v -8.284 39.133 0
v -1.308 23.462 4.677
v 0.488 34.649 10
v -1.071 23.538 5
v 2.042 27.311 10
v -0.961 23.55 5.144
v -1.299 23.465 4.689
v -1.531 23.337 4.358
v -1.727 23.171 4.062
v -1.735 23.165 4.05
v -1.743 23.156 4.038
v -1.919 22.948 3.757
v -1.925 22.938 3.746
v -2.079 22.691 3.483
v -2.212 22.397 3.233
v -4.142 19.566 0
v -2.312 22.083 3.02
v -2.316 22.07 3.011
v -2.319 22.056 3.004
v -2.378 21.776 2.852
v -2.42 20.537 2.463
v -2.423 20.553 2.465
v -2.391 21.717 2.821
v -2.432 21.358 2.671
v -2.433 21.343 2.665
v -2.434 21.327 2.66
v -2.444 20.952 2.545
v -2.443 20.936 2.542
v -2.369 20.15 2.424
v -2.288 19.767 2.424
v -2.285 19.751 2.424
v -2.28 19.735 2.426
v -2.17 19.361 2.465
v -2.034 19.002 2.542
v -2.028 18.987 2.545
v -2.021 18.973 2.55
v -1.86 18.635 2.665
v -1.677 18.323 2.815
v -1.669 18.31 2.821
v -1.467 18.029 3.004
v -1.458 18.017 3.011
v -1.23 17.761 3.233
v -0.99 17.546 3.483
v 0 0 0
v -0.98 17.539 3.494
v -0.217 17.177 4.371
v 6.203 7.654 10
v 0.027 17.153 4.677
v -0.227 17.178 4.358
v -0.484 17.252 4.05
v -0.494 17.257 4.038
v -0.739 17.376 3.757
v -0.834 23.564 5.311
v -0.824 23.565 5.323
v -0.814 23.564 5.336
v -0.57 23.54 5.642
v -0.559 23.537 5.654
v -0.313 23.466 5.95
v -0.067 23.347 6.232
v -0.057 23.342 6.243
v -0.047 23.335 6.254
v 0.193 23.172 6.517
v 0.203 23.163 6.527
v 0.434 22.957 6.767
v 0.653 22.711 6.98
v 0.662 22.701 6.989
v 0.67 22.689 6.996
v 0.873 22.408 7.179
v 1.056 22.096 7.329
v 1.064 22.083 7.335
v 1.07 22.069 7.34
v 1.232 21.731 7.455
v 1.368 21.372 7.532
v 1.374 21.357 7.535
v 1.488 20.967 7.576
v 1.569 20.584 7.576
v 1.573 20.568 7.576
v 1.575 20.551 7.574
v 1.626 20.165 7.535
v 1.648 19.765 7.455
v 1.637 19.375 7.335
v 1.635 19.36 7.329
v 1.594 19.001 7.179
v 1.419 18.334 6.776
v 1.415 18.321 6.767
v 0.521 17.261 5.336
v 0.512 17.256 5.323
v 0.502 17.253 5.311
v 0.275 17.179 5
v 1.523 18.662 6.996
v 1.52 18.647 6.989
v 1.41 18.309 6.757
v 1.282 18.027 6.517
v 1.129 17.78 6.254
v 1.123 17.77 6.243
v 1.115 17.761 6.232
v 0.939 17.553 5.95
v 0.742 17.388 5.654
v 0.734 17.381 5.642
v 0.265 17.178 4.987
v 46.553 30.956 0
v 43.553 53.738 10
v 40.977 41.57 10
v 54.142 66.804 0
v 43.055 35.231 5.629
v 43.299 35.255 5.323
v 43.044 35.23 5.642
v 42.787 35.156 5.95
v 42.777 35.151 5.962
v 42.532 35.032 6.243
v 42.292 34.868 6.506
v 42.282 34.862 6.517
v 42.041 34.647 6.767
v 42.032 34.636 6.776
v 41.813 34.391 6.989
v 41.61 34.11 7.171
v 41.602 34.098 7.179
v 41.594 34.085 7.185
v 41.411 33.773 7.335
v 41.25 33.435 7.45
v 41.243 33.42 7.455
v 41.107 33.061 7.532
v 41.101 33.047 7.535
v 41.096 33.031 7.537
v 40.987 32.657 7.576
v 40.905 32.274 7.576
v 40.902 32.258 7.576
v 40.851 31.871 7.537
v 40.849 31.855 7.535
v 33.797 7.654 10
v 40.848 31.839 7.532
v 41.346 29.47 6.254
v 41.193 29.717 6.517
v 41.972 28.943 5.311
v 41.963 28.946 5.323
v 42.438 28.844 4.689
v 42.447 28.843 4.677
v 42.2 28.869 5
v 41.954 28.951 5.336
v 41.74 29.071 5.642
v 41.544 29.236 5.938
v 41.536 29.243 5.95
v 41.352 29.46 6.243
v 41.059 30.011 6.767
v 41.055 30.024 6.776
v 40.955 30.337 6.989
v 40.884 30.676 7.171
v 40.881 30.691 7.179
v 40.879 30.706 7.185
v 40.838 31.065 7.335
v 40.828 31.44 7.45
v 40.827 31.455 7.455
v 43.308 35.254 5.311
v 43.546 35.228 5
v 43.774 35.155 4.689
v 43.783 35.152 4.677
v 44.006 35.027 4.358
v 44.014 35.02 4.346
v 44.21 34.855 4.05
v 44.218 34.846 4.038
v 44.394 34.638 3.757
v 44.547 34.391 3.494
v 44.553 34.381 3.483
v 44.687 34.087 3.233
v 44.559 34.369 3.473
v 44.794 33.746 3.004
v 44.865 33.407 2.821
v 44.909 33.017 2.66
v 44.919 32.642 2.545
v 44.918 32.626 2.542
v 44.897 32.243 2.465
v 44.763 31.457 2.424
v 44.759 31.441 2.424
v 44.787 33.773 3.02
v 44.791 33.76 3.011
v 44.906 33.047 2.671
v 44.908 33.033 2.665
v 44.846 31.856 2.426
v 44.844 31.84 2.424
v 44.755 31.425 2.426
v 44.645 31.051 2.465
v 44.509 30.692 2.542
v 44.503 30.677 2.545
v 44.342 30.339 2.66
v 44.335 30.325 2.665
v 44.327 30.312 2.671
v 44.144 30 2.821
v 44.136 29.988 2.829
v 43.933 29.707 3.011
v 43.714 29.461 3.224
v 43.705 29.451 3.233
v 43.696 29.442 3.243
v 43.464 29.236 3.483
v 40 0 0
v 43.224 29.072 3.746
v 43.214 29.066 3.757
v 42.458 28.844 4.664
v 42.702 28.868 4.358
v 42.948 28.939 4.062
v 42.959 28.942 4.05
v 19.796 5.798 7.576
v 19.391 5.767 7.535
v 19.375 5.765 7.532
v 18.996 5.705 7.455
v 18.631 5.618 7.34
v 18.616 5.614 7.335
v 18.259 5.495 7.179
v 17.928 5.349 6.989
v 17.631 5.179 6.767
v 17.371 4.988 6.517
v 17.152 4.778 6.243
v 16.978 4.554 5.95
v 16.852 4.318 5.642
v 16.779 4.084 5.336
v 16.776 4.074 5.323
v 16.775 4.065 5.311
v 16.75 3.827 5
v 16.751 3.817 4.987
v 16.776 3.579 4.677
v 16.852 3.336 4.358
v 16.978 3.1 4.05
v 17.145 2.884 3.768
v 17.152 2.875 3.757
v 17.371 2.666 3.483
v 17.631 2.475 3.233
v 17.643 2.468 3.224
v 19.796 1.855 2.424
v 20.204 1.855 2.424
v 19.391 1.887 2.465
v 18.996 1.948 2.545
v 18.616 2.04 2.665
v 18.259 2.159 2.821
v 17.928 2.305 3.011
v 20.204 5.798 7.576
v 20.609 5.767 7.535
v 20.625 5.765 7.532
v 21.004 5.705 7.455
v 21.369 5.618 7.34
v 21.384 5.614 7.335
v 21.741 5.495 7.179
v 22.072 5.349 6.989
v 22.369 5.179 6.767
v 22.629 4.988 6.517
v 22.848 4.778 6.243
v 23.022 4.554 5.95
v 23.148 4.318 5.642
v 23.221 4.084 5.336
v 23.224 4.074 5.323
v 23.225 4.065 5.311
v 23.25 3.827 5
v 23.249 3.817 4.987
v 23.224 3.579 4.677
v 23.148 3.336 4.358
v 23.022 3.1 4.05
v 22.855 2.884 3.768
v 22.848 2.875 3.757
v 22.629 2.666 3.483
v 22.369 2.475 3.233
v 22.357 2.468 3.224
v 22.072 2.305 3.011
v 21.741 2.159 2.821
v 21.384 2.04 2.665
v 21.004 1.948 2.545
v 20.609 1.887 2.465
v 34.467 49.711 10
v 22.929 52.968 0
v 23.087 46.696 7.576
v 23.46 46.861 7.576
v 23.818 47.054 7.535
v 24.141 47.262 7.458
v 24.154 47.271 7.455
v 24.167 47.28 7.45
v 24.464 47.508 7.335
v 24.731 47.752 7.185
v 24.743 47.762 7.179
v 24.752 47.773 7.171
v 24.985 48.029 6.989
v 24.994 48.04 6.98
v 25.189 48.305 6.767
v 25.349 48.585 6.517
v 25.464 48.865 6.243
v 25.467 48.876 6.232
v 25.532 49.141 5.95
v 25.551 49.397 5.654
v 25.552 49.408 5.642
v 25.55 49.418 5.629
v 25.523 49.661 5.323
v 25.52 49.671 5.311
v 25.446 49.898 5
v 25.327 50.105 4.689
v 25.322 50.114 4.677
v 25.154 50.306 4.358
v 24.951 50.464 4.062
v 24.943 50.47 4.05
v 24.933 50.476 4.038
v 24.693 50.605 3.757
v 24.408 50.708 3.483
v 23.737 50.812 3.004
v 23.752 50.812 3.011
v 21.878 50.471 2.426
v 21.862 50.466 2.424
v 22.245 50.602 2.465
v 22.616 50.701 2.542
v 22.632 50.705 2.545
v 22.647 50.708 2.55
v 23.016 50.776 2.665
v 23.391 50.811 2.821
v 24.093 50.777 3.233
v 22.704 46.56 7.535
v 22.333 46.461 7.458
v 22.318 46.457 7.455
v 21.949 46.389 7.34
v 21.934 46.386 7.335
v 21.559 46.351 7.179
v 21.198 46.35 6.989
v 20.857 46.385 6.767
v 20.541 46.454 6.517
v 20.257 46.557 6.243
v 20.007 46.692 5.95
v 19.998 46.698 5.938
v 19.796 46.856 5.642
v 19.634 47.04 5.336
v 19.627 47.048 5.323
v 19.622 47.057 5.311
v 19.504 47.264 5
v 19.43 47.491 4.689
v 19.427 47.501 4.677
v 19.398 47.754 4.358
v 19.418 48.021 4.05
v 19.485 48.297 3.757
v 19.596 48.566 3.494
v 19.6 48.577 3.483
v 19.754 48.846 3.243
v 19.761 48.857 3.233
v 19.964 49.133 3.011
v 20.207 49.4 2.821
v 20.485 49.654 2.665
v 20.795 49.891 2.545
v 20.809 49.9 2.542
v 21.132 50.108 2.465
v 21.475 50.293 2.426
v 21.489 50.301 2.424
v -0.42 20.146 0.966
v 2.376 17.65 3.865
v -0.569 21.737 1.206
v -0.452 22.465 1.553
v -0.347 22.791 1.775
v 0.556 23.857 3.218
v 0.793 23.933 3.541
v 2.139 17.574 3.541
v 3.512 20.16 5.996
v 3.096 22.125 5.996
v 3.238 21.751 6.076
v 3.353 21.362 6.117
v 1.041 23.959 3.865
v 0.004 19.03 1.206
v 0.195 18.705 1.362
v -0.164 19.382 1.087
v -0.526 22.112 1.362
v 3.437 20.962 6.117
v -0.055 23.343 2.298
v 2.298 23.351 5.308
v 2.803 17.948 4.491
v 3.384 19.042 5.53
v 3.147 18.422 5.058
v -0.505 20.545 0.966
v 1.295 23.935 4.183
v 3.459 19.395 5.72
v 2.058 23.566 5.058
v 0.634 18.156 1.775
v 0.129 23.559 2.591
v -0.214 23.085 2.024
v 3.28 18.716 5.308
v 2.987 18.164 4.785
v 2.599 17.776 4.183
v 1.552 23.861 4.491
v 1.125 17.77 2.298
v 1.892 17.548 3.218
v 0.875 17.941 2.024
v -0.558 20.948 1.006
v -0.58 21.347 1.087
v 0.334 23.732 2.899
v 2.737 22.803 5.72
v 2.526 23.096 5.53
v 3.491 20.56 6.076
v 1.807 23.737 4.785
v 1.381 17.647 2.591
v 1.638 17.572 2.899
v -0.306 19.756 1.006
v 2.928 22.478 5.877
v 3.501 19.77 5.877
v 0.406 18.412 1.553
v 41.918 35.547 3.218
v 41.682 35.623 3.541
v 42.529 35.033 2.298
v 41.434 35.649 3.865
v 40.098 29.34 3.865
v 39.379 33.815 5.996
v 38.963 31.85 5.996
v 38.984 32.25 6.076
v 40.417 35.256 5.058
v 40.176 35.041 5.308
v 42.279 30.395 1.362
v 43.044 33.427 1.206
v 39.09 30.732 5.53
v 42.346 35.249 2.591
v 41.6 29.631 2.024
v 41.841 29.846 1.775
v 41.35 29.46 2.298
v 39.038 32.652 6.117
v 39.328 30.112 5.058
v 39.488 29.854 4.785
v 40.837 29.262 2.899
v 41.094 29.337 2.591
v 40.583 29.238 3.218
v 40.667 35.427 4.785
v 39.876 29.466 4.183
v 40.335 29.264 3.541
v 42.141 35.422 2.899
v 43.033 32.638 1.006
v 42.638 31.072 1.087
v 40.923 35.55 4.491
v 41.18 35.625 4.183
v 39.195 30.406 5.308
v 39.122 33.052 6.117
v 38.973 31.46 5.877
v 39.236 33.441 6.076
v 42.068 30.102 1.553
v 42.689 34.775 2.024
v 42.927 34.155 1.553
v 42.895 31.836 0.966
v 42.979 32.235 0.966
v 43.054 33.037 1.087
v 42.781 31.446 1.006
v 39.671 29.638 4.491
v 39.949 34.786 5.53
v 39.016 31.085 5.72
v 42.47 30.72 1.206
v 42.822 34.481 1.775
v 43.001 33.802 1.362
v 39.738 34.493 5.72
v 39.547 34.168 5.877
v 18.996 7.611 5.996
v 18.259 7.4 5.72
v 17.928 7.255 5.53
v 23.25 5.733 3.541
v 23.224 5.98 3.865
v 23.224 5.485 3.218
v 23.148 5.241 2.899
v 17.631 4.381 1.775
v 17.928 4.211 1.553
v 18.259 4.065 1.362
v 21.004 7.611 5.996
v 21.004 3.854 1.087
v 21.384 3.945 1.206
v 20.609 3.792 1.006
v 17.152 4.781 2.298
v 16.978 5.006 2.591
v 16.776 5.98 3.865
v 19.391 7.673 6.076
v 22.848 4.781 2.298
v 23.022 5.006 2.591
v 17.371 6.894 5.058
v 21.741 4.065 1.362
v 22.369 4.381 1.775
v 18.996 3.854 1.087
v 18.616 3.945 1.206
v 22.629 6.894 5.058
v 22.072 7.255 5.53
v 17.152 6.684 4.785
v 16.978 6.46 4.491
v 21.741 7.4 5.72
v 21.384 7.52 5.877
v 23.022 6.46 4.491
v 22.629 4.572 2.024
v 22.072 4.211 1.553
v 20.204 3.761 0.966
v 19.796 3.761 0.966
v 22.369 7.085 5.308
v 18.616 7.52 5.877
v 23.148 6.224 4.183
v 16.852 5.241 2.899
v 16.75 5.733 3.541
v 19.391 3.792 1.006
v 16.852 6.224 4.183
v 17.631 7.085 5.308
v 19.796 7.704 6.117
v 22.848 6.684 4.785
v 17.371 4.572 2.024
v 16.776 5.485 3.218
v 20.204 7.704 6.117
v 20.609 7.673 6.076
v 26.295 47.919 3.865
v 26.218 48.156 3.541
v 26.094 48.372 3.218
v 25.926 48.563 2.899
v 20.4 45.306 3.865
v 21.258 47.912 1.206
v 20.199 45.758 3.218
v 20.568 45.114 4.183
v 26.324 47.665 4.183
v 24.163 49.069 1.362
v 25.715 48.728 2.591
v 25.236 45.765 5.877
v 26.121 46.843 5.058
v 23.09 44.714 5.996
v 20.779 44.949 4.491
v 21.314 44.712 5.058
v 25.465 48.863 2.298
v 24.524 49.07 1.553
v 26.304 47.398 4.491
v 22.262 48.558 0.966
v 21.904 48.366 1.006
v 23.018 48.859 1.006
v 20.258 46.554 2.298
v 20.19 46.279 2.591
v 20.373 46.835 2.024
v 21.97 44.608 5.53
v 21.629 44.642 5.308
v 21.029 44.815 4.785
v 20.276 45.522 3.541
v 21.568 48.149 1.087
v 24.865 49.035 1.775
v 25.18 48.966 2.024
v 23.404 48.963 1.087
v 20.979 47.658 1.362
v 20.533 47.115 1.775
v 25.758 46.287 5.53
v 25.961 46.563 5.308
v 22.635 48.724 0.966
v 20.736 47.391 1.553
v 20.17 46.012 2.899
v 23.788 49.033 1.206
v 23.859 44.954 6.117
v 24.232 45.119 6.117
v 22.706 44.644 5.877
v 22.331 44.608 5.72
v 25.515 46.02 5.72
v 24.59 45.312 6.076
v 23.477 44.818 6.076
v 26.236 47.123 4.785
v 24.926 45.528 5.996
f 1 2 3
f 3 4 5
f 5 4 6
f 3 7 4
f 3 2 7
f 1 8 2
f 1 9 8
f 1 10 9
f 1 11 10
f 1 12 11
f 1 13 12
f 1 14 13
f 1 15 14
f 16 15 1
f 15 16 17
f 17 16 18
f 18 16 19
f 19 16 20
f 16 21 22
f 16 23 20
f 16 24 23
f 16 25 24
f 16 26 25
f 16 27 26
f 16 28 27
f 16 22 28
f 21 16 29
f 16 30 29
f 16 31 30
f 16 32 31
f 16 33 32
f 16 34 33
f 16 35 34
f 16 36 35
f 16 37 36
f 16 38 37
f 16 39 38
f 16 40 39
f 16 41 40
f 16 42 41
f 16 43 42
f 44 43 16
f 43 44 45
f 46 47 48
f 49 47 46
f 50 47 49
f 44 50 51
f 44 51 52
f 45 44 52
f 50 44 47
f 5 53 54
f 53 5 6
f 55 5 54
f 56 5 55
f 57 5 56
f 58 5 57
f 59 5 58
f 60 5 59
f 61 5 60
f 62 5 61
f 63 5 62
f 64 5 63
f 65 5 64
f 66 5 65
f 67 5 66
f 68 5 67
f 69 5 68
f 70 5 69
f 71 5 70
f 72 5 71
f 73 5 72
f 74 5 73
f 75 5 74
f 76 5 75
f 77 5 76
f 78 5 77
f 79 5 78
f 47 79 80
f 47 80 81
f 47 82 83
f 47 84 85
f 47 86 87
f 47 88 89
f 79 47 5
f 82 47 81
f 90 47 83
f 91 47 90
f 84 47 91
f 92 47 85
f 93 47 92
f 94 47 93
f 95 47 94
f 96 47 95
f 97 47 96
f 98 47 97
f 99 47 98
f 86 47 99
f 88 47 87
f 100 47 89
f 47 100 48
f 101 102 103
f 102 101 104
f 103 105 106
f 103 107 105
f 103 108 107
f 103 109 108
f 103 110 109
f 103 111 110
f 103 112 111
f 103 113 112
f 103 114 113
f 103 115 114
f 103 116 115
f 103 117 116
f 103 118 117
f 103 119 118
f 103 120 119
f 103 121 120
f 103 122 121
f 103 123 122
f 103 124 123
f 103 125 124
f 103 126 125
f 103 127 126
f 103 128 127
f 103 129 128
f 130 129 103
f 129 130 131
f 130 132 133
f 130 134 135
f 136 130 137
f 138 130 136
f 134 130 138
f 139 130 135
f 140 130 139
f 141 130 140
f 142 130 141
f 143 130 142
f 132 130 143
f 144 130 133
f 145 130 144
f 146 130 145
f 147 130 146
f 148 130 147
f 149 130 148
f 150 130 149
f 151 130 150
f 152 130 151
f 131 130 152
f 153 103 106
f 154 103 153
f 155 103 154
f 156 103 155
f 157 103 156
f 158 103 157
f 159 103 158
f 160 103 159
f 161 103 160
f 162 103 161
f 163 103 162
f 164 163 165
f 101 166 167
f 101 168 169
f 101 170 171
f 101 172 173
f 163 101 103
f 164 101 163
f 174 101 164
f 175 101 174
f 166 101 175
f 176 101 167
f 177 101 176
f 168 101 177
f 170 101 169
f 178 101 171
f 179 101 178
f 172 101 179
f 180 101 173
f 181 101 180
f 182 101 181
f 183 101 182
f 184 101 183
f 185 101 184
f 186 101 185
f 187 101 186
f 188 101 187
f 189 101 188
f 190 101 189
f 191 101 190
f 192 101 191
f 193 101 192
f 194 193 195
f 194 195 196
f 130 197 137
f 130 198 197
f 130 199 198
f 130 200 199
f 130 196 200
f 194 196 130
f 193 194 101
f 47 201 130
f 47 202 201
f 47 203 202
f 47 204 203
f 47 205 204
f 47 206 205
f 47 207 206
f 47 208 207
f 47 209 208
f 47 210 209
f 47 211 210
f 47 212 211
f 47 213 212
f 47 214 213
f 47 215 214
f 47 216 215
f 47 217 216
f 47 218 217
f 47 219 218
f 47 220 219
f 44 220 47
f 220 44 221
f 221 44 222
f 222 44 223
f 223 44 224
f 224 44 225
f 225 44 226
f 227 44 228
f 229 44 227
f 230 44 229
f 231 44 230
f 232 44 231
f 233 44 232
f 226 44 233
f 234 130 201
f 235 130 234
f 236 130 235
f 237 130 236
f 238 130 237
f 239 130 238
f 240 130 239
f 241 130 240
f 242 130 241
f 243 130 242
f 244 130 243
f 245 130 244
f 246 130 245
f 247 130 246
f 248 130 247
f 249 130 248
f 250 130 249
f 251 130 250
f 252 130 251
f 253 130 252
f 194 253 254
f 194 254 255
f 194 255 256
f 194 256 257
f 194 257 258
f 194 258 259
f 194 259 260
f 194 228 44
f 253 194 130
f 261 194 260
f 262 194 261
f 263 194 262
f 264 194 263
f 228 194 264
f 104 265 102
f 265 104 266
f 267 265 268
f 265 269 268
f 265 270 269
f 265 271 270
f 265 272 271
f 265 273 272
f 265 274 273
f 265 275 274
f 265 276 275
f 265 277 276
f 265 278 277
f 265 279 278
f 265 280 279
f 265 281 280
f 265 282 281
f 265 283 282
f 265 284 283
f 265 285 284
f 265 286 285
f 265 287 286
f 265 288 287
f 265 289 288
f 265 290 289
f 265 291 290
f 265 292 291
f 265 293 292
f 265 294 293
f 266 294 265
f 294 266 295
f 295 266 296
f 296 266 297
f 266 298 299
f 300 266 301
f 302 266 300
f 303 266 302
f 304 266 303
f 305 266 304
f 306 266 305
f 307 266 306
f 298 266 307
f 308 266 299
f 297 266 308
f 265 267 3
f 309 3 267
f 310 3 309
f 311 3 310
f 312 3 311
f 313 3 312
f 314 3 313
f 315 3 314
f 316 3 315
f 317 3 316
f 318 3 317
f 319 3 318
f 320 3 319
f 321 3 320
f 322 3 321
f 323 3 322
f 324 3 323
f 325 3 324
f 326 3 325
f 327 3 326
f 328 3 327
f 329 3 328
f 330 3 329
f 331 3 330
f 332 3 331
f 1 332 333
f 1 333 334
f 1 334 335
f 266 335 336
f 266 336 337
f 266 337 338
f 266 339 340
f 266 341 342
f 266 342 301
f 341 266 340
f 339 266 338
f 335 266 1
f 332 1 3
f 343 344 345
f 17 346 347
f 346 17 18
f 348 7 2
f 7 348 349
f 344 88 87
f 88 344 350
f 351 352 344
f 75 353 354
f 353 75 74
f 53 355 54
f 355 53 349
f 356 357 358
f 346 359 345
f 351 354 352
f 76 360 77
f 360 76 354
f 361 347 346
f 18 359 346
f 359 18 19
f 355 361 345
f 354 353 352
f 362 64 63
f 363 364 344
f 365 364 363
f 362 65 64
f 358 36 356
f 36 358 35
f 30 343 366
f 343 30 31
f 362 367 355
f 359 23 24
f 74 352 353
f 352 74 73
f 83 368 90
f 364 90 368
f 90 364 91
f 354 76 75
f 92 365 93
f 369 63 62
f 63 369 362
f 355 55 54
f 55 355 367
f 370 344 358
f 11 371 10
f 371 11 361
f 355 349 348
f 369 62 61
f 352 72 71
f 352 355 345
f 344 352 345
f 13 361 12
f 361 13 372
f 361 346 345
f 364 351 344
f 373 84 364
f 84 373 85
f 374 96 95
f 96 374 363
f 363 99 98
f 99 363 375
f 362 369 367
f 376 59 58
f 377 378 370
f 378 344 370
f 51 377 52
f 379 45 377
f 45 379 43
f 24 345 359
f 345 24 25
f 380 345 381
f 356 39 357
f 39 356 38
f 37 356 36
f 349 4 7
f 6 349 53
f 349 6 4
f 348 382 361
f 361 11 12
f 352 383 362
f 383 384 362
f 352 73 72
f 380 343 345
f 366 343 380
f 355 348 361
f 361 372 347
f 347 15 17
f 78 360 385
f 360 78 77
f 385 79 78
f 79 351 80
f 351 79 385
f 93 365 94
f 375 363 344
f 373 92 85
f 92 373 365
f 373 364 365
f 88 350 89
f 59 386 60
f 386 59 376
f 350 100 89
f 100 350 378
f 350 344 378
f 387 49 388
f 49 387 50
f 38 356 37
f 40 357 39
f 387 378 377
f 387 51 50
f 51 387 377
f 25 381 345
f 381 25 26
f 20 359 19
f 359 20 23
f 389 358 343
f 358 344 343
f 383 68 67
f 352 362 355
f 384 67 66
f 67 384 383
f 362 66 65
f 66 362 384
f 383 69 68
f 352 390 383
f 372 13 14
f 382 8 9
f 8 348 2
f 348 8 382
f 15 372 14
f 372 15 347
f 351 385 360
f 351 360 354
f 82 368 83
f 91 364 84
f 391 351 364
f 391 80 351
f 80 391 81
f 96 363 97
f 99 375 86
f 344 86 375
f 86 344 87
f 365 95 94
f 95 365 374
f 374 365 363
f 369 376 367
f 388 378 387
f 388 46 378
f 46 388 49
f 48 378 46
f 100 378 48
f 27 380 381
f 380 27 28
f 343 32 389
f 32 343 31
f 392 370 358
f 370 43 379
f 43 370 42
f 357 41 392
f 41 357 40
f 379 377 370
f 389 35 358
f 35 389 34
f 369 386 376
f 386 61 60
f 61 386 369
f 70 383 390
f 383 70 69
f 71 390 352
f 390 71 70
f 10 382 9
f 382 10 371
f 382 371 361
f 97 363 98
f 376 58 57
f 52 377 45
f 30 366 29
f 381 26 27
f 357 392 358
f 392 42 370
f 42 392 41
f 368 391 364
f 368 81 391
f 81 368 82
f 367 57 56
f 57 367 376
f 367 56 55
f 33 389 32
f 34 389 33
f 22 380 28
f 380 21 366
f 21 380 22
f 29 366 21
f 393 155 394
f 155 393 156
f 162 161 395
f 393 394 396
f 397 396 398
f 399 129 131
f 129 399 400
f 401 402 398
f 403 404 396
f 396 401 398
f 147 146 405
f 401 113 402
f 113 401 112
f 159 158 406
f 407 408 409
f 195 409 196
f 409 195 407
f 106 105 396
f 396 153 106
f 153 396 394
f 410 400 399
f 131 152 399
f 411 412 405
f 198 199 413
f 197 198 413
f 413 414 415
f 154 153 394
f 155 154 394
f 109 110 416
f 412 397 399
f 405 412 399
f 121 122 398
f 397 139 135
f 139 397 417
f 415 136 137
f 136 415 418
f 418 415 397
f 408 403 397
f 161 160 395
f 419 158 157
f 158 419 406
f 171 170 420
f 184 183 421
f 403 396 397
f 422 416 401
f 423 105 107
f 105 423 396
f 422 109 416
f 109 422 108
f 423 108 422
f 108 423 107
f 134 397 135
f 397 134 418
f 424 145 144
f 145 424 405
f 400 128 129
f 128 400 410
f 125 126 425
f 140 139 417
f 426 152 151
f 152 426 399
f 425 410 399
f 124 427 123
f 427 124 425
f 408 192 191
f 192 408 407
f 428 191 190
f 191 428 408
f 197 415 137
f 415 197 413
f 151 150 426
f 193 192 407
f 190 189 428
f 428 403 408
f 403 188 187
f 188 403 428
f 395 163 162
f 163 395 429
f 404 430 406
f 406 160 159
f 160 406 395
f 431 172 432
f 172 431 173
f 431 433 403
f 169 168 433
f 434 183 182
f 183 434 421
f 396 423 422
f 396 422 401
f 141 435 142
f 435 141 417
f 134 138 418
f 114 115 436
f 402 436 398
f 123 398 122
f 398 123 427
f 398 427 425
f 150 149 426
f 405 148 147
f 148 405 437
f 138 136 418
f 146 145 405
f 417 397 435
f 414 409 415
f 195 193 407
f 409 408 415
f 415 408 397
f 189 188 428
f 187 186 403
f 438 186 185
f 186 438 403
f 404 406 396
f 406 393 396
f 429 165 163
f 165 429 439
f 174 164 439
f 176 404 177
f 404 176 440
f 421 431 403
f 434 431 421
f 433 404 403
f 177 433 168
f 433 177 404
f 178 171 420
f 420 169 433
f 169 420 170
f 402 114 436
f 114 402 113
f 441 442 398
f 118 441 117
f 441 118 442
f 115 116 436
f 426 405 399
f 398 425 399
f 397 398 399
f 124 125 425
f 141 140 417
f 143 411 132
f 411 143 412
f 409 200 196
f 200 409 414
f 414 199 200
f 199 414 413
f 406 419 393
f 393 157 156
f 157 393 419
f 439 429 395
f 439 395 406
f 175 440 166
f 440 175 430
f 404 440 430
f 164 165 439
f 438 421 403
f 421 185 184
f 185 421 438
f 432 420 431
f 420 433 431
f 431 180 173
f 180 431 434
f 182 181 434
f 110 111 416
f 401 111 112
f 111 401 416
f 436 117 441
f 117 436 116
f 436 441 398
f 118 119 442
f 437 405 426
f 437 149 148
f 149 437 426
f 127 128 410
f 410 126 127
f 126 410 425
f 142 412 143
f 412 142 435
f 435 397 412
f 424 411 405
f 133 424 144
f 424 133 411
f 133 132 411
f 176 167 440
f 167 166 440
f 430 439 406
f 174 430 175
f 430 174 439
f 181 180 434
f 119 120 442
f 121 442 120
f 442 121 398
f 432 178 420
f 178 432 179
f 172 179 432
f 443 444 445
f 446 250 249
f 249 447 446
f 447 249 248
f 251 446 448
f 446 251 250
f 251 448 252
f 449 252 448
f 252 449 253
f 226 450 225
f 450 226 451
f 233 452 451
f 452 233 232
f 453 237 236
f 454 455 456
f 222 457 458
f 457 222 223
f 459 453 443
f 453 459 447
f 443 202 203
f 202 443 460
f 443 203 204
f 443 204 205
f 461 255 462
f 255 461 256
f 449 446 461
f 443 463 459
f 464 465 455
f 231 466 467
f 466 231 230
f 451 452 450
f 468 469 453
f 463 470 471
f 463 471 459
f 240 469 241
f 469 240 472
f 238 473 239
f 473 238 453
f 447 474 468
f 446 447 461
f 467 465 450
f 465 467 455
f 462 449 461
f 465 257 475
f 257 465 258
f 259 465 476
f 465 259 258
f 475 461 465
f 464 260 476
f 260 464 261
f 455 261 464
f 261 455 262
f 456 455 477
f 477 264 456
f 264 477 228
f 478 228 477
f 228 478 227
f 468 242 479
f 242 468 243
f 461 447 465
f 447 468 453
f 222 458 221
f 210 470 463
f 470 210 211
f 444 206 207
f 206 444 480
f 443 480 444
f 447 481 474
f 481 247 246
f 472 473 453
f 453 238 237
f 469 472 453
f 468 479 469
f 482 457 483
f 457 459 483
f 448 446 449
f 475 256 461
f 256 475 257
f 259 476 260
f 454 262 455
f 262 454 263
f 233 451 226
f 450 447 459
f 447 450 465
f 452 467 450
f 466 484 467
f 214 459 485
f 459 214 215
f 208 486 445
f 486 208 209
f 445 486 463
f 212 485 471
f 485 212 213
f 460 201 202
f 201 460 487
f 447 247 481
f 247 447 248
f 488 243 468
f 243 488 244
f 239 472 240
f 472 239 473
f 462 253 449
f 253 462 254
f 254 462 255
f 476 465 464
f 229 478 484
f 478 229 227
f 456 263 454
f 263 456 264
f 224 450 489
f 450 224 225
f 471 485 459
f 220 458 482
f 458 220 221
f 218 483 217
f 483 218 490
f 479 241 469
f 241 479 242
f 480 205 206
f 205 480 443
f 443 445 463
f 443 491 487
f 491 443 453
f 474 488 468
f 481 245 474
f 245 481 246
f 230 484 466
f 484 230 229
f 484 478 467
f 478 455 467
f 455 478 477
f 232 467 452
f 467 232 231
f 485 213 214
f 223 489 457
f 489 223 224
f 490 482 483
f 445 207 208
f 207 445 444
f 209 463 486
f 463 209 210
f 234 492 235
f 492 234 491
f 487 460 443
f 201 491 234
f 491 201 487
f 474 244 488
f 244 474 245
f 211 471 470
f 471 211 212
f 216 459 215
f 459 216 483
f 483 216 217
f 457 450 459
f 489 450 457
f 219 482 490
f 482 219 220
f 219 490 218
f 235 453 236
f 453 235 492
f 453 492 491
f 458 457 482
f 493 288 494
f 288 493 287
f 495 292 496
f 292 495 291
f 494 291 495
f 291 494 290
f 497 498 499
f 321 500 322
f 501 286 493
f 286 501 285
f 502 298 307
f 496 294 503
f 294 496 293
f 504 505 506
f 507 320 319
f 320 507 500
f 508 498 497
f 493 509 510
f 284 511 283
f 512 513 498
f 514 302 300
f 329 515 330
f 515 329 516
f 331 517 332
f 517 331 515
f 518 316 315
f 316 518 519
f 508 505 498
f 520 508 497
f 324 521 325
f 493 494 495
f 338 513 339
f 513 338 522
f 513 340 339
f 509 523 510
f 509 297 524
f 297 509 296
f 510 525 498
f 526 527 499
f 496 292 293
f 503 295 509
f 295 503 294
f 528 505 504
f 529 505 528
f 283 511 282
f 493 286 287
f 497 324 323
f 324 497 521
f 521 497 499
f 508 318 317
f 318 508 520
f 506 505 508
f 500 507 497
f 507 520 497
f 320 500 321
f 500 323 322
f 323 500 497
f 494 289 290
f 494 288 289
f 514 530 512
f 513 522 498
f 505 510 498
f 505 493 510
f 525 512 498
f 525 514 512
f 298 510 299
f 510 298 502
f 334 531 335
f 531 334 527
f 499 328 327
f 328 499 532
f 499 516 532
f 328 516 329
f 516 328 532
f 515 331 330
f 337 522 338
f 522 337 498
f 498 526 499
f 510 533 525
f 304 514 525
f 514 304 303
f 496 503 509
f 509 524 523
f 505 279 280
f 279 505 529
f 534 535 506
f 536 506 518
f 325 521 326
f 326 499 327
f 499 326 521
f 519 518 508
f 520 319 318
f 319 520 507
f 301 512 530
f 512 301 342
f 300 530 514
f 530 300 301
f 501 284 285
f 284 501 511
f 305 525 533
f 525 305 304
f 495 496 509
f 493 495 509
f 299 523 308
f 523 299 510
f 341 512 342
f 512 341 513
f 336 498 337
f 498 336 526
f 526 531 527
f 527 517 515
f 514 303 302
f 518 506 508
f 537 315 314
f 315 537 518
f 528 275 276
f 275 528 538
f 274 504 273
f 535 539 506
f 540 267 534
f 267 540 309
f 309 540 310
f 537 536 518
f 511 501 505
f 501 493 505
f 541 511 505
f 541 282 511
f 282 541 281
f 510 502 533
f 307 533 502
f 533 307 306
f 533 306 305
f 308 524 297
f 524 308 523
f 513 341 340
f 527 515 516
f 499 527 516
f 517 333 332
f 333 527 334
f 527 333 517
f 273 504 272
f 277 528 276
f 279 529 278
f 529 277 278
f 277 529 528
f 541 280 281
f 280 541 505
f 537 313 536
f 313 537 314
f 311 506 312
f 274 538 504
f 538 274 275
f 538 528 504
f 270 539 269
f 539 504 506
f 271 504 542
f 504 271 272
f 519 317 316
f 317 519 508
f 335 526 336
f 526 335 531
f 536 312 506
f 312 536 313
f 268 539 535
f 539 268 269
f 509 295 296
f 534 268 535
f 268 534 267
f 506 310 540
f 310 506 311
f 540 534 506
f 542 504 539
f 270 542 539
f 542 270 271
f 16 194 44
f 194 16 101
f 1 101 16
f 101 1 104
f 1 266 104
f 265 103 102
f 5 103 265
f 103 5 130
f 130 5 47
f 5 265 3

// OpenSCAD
/*
Trapezohedra with magnets tile, by eshira
Use axially aligned magnets (4 per tile).
The tiles are split into two groups with distinct magnet patterns:
The top half and bottom half of the trapezohedron.
The long sides of a tile must have opposite poles facing out
All tiles from both groups must be identical with respect to the long sides.
The short sides of a tile must have opposite poles facing out
One group must have the opposite polarity of the other group with respect to the short sides.
*/

//User Defined Variables
side = 40; //side length of the short side
thickness = 10; //how thick (z dimension) the tile is
magnetdepth = 2.5; //depth of the magnet holes; tailor this to suit your 3d printer
magnetdiam = 6.5; //diameter of the magnet holes; tailor this to suit your 3d printer

//Other
$fn=50;
M_PI = 3.14159265359;

//Choose one from the following tile types to uncomment:
//trigonal();
tetragonal();
//pentagonal();
//hexagonal();
//heptagonal();
//octagonal();

module magnetA(dihedral,alpha, side2) {
    sdiag = side*sqrt( 2*(1-cos(alpha)) ); //short diagonal of the kite
    ldiag = sin(alpha)*side2/sin(alpha/2); //long diagonal of the kite 
    t_h = 0.5*side*(1/cos(alpha/2))*sin(alpha/2)*sin(dihedral/2)/sin(90-0.5*dihedral);   
    ptr = .5*thickness/t_h;
    extra=.1;
    //Place the magnet in the exact middle of the face; mix movement along long diagonal with movement along side, weighed by ptr
    translate([ptr*0.5*side*(1/cos(alpha/2))*cos(alpha/2)-0.5*(1-ptr)*side*sin(alpha-90),ptr*0.5*side*(1/cos(alpha/2))*sin(alpha/2)+0.5*(1-ptr)*side*sin(alpha),ptr*t_h]){
        rotate([180-dihedral/2,0,alpha]){
            translate([0,0,-extra]){
                linear_extrude(center=false,height=magnetdepth){ circle(magnetdiam/2);}
            }
        }
    }
}

module magnetB(dihedral,alpha,side2){
    sdiag = side*sqrt( 2*(1-cos(alpha)) ); //short diagonal of the kite
    ldiag = sin(alpha)*side2/sin(alpha/2); //long diagonal of the kite 
    t_h = 0.5*side*(1/cos(alpha/2))*sin(alpha/2)*sin(dihedral/2)/sin(90-0.5*dihedral);   
    ptr = .5*thickness/t_h;
    extra=.1;
    //Place the magnet in the exact middle of the face; mix movement along long diagonal with movement along side, weighed by ptr

    translate([side-ptr*0.5*side*(1/cos(alpha/2))*cos(alpha/2)+0.5*(1-ptr)*side2*cos(180-alpha),ptr*0.5*side*(1/cos(alpha/2))*sin(alpha/2)+0.5*(1-ptr)*side2*sin(180-alpha),ptr*t_h]){
        rotate([-180+dihedral/2,0,180-alpha]){
            translate([0,0,-extra]){
                linear_extrude(center=false,height=magnetdepth){ circle(magnetdiam/2);}
            }
        }

    }
}

module magnets(dihedral,alpha,side2){
    magnetA(dihedral,alpha,side2);
    magnetB(dihedral,alpha,side2);
    mirror([0,1,0]){ rotate([0,0,-alpha]){magnetA(dihedral,alpha,side2);}}	
    mirror([0,1,0]){ rotate([0,0,-alpha]){magnetB(dihedral,alpha,side2);}}
}

module chamfers(dihedral,alpha,beta,side2) {
    rotate([(180-dihedral)/2,0,alpha]){
        linear_extrude(center=true, height=thickness*10) {
            polygon([[-5,0],[-5,thickness],[side+5,thickness],[side+5,0]]);
        }
    }
    translate([side,0,0]){
        rotate([(-180+dihedral)/2,0,180-alpha]){
            translate([0,-thickness,0]){
                linear_extrude(center=true, height=thickness*10) { polygon([[-5,0],[-5,thickness],[side2,thickness],[side2,0]]); }
            }
        }
    }

    rotate([(-180+dihedral)/2,0,0]){
        translate([2.5,-thickness,0]){
            linear_extrude(center=true, height=thickness*10) { polygon([[-5,0],[-5,thickness],[side,thickness],[side,0]]); }
        }
    }

    translate([side*cos(alpha),side*sin(alpha),0]){
        mirror([0,1,0]){
            rotate([(-180+dihedral)/2,0,-180+alpha+beta]){
                translate([2.5,-thickness,0]){
                    linear_extrude(center=true, height=thickness*10) { polygon([[-5,0],[-5,thickness],[side2,thickness],[side2,0]]);}
                }
            }
        }
    }
}

module trigonal(){ //really a cube
    dihedral = 90;
    s = side; //a square, all sides are the same, all angles 90 degrees
    difference(){
        linear_extrude(height=thickness){
            polygon([[0,0],[s,0],[s,s],[0,s]]);
        }
        union(){
            chamfers(dihedral,90,90,s);
            magnets(dihedral,90,s);
        }
    }
    echo("Print 6 faces.");
}

module tetragonal(){
    dihedral = acos(-(2*sqrt(2)-1)/7);
    s1 = sqrt(sqrt(2)-1); //sides based on unit edge length square antiprism
    s2 = sqrt(2*(1+sqrt(2)))/2;
    side2 = s2*side/s1; //adjusted side based on user input
    A1 = 54.14143232789412; //acute interior angle of the kite
    A2 = 101.95285589070195; //all three other interior angles of the kite are the same
    difference(){
        linear_extrude(height=thickness){ polygon([[0,0],[side,0],[side+side2*cos(180-A2),side2*sin(180-A2)],[-side*cos(180-A2),side*sin(180-A2)]]); }
        union(){
            chamfers(dihedral,A2,A1,side2);
            magnets(dihedral,A2,side2);
        }
    }
    echo("Print 8 faces.");
}

module pentagonal(){
    dihedral = acos(-sqrt(5)/5);
    s1 = (sqrt(5)-1)/2;
    s2 = (1+sqrt(5))/2;
    side2 = s2*side/s1; //adjusted side based on user input
    A1 = 36; //acute interior angle of the kite
    A2 = 108; //all three other interior angles of the kite are the same
    difference(){
        linear_extrude(height=thickness){polygon([[0,0],[side,0],[side+side2*cos(180-A2),side2*sin(180-A2)],[-side*cos(180-A2),side*sin(180-A2)]]);}
        union() {
            chamfers(dihedral,A2,A1,side2);
            magnets(dihedral,A2,side2);
        }
    }
    echo("Print 10 faces.");
}

module hexagonal(){
    dihedral = acos(-sqrt(3)/3);
    s1 = sqrt(2*(sqrt(3)-1))/2;
    s2 = sqrt(2*(5+3*sqrt(3)))/2 ;
    side2 = s2*side/s1; //adjusted side based on user input
    A1 = 25.587895702680132; //acute interior angle of the kite
    A2 = 111.47070143243995; //all three other interior angles of the kite are the same
    difference(){
        linear_extrude(height=thickness){ polygon([[0,0],[side,0],[side+side2*cos(180-A2),side2*sin(180-A2)],[-side*cos(180-A2),side*sin(180-A2)]]);}
        union(){
            chamfers(dihedral,A2,A1,side2);
            magnets(dihedral,A2,side2);
        }
    }
    echo("Print 12 faces.");
}

module heptagonal(){
    dihedral = 132.017867361;
    s1 = 0.59740762289429270714;
    s2 = 3.0162617059937969890;
    side2 = s2*side/s1; //adjusted side based on user input
    A1 = 19.083716786371607; //acute interior angle of the kite
    A2 = 113.63876107120947; //all three other interior angles of the kite are the same
    difference(){
        linear_extrude(height=thickness){polygon([[0,0],[side,0],[side+side2*cos(180-A2),side2*sin(180-A2)],[-side*cos(180-A2),side*sin(180-A2)]]);}
        union(){
            chamfers(dihedral,A2,A1,side2);
            magnets(dihedral,A2,side2);
        }
    }
    echo("Print 14 faces.");
}

module octagonal(){
    dihedral = 137.370466429;
    s1 = sqrt(1-sqrt(2)+sqrt(2-sqrt(2)));
    s2 = sqrt(2*(8+5*sqrt(2)+sqrt(2*(58+41*sqrt(2)))))/2 ;
    side2 = s2*side/s1; //adjusted side based on user input
    A1 = 14.76071381173551; //acute interior angle of the kite
    A2 = 115.07976206275484; //all three other interior angles of the kite are the same
    difference(){
        linear_extrude(height=thickness){ polygon([[0,0],[side,0],[side+side2*cos(180-A2),side2*sin(180-A2)],[-side*cos(180-A2),side*sin(180-A2)]]);}
        union(){
            chamfers(dihedral,A2,A1,side2);
            magnets(dihedral,A2,side2);
        }
    }
    echo("Print 16 faces.");
}
